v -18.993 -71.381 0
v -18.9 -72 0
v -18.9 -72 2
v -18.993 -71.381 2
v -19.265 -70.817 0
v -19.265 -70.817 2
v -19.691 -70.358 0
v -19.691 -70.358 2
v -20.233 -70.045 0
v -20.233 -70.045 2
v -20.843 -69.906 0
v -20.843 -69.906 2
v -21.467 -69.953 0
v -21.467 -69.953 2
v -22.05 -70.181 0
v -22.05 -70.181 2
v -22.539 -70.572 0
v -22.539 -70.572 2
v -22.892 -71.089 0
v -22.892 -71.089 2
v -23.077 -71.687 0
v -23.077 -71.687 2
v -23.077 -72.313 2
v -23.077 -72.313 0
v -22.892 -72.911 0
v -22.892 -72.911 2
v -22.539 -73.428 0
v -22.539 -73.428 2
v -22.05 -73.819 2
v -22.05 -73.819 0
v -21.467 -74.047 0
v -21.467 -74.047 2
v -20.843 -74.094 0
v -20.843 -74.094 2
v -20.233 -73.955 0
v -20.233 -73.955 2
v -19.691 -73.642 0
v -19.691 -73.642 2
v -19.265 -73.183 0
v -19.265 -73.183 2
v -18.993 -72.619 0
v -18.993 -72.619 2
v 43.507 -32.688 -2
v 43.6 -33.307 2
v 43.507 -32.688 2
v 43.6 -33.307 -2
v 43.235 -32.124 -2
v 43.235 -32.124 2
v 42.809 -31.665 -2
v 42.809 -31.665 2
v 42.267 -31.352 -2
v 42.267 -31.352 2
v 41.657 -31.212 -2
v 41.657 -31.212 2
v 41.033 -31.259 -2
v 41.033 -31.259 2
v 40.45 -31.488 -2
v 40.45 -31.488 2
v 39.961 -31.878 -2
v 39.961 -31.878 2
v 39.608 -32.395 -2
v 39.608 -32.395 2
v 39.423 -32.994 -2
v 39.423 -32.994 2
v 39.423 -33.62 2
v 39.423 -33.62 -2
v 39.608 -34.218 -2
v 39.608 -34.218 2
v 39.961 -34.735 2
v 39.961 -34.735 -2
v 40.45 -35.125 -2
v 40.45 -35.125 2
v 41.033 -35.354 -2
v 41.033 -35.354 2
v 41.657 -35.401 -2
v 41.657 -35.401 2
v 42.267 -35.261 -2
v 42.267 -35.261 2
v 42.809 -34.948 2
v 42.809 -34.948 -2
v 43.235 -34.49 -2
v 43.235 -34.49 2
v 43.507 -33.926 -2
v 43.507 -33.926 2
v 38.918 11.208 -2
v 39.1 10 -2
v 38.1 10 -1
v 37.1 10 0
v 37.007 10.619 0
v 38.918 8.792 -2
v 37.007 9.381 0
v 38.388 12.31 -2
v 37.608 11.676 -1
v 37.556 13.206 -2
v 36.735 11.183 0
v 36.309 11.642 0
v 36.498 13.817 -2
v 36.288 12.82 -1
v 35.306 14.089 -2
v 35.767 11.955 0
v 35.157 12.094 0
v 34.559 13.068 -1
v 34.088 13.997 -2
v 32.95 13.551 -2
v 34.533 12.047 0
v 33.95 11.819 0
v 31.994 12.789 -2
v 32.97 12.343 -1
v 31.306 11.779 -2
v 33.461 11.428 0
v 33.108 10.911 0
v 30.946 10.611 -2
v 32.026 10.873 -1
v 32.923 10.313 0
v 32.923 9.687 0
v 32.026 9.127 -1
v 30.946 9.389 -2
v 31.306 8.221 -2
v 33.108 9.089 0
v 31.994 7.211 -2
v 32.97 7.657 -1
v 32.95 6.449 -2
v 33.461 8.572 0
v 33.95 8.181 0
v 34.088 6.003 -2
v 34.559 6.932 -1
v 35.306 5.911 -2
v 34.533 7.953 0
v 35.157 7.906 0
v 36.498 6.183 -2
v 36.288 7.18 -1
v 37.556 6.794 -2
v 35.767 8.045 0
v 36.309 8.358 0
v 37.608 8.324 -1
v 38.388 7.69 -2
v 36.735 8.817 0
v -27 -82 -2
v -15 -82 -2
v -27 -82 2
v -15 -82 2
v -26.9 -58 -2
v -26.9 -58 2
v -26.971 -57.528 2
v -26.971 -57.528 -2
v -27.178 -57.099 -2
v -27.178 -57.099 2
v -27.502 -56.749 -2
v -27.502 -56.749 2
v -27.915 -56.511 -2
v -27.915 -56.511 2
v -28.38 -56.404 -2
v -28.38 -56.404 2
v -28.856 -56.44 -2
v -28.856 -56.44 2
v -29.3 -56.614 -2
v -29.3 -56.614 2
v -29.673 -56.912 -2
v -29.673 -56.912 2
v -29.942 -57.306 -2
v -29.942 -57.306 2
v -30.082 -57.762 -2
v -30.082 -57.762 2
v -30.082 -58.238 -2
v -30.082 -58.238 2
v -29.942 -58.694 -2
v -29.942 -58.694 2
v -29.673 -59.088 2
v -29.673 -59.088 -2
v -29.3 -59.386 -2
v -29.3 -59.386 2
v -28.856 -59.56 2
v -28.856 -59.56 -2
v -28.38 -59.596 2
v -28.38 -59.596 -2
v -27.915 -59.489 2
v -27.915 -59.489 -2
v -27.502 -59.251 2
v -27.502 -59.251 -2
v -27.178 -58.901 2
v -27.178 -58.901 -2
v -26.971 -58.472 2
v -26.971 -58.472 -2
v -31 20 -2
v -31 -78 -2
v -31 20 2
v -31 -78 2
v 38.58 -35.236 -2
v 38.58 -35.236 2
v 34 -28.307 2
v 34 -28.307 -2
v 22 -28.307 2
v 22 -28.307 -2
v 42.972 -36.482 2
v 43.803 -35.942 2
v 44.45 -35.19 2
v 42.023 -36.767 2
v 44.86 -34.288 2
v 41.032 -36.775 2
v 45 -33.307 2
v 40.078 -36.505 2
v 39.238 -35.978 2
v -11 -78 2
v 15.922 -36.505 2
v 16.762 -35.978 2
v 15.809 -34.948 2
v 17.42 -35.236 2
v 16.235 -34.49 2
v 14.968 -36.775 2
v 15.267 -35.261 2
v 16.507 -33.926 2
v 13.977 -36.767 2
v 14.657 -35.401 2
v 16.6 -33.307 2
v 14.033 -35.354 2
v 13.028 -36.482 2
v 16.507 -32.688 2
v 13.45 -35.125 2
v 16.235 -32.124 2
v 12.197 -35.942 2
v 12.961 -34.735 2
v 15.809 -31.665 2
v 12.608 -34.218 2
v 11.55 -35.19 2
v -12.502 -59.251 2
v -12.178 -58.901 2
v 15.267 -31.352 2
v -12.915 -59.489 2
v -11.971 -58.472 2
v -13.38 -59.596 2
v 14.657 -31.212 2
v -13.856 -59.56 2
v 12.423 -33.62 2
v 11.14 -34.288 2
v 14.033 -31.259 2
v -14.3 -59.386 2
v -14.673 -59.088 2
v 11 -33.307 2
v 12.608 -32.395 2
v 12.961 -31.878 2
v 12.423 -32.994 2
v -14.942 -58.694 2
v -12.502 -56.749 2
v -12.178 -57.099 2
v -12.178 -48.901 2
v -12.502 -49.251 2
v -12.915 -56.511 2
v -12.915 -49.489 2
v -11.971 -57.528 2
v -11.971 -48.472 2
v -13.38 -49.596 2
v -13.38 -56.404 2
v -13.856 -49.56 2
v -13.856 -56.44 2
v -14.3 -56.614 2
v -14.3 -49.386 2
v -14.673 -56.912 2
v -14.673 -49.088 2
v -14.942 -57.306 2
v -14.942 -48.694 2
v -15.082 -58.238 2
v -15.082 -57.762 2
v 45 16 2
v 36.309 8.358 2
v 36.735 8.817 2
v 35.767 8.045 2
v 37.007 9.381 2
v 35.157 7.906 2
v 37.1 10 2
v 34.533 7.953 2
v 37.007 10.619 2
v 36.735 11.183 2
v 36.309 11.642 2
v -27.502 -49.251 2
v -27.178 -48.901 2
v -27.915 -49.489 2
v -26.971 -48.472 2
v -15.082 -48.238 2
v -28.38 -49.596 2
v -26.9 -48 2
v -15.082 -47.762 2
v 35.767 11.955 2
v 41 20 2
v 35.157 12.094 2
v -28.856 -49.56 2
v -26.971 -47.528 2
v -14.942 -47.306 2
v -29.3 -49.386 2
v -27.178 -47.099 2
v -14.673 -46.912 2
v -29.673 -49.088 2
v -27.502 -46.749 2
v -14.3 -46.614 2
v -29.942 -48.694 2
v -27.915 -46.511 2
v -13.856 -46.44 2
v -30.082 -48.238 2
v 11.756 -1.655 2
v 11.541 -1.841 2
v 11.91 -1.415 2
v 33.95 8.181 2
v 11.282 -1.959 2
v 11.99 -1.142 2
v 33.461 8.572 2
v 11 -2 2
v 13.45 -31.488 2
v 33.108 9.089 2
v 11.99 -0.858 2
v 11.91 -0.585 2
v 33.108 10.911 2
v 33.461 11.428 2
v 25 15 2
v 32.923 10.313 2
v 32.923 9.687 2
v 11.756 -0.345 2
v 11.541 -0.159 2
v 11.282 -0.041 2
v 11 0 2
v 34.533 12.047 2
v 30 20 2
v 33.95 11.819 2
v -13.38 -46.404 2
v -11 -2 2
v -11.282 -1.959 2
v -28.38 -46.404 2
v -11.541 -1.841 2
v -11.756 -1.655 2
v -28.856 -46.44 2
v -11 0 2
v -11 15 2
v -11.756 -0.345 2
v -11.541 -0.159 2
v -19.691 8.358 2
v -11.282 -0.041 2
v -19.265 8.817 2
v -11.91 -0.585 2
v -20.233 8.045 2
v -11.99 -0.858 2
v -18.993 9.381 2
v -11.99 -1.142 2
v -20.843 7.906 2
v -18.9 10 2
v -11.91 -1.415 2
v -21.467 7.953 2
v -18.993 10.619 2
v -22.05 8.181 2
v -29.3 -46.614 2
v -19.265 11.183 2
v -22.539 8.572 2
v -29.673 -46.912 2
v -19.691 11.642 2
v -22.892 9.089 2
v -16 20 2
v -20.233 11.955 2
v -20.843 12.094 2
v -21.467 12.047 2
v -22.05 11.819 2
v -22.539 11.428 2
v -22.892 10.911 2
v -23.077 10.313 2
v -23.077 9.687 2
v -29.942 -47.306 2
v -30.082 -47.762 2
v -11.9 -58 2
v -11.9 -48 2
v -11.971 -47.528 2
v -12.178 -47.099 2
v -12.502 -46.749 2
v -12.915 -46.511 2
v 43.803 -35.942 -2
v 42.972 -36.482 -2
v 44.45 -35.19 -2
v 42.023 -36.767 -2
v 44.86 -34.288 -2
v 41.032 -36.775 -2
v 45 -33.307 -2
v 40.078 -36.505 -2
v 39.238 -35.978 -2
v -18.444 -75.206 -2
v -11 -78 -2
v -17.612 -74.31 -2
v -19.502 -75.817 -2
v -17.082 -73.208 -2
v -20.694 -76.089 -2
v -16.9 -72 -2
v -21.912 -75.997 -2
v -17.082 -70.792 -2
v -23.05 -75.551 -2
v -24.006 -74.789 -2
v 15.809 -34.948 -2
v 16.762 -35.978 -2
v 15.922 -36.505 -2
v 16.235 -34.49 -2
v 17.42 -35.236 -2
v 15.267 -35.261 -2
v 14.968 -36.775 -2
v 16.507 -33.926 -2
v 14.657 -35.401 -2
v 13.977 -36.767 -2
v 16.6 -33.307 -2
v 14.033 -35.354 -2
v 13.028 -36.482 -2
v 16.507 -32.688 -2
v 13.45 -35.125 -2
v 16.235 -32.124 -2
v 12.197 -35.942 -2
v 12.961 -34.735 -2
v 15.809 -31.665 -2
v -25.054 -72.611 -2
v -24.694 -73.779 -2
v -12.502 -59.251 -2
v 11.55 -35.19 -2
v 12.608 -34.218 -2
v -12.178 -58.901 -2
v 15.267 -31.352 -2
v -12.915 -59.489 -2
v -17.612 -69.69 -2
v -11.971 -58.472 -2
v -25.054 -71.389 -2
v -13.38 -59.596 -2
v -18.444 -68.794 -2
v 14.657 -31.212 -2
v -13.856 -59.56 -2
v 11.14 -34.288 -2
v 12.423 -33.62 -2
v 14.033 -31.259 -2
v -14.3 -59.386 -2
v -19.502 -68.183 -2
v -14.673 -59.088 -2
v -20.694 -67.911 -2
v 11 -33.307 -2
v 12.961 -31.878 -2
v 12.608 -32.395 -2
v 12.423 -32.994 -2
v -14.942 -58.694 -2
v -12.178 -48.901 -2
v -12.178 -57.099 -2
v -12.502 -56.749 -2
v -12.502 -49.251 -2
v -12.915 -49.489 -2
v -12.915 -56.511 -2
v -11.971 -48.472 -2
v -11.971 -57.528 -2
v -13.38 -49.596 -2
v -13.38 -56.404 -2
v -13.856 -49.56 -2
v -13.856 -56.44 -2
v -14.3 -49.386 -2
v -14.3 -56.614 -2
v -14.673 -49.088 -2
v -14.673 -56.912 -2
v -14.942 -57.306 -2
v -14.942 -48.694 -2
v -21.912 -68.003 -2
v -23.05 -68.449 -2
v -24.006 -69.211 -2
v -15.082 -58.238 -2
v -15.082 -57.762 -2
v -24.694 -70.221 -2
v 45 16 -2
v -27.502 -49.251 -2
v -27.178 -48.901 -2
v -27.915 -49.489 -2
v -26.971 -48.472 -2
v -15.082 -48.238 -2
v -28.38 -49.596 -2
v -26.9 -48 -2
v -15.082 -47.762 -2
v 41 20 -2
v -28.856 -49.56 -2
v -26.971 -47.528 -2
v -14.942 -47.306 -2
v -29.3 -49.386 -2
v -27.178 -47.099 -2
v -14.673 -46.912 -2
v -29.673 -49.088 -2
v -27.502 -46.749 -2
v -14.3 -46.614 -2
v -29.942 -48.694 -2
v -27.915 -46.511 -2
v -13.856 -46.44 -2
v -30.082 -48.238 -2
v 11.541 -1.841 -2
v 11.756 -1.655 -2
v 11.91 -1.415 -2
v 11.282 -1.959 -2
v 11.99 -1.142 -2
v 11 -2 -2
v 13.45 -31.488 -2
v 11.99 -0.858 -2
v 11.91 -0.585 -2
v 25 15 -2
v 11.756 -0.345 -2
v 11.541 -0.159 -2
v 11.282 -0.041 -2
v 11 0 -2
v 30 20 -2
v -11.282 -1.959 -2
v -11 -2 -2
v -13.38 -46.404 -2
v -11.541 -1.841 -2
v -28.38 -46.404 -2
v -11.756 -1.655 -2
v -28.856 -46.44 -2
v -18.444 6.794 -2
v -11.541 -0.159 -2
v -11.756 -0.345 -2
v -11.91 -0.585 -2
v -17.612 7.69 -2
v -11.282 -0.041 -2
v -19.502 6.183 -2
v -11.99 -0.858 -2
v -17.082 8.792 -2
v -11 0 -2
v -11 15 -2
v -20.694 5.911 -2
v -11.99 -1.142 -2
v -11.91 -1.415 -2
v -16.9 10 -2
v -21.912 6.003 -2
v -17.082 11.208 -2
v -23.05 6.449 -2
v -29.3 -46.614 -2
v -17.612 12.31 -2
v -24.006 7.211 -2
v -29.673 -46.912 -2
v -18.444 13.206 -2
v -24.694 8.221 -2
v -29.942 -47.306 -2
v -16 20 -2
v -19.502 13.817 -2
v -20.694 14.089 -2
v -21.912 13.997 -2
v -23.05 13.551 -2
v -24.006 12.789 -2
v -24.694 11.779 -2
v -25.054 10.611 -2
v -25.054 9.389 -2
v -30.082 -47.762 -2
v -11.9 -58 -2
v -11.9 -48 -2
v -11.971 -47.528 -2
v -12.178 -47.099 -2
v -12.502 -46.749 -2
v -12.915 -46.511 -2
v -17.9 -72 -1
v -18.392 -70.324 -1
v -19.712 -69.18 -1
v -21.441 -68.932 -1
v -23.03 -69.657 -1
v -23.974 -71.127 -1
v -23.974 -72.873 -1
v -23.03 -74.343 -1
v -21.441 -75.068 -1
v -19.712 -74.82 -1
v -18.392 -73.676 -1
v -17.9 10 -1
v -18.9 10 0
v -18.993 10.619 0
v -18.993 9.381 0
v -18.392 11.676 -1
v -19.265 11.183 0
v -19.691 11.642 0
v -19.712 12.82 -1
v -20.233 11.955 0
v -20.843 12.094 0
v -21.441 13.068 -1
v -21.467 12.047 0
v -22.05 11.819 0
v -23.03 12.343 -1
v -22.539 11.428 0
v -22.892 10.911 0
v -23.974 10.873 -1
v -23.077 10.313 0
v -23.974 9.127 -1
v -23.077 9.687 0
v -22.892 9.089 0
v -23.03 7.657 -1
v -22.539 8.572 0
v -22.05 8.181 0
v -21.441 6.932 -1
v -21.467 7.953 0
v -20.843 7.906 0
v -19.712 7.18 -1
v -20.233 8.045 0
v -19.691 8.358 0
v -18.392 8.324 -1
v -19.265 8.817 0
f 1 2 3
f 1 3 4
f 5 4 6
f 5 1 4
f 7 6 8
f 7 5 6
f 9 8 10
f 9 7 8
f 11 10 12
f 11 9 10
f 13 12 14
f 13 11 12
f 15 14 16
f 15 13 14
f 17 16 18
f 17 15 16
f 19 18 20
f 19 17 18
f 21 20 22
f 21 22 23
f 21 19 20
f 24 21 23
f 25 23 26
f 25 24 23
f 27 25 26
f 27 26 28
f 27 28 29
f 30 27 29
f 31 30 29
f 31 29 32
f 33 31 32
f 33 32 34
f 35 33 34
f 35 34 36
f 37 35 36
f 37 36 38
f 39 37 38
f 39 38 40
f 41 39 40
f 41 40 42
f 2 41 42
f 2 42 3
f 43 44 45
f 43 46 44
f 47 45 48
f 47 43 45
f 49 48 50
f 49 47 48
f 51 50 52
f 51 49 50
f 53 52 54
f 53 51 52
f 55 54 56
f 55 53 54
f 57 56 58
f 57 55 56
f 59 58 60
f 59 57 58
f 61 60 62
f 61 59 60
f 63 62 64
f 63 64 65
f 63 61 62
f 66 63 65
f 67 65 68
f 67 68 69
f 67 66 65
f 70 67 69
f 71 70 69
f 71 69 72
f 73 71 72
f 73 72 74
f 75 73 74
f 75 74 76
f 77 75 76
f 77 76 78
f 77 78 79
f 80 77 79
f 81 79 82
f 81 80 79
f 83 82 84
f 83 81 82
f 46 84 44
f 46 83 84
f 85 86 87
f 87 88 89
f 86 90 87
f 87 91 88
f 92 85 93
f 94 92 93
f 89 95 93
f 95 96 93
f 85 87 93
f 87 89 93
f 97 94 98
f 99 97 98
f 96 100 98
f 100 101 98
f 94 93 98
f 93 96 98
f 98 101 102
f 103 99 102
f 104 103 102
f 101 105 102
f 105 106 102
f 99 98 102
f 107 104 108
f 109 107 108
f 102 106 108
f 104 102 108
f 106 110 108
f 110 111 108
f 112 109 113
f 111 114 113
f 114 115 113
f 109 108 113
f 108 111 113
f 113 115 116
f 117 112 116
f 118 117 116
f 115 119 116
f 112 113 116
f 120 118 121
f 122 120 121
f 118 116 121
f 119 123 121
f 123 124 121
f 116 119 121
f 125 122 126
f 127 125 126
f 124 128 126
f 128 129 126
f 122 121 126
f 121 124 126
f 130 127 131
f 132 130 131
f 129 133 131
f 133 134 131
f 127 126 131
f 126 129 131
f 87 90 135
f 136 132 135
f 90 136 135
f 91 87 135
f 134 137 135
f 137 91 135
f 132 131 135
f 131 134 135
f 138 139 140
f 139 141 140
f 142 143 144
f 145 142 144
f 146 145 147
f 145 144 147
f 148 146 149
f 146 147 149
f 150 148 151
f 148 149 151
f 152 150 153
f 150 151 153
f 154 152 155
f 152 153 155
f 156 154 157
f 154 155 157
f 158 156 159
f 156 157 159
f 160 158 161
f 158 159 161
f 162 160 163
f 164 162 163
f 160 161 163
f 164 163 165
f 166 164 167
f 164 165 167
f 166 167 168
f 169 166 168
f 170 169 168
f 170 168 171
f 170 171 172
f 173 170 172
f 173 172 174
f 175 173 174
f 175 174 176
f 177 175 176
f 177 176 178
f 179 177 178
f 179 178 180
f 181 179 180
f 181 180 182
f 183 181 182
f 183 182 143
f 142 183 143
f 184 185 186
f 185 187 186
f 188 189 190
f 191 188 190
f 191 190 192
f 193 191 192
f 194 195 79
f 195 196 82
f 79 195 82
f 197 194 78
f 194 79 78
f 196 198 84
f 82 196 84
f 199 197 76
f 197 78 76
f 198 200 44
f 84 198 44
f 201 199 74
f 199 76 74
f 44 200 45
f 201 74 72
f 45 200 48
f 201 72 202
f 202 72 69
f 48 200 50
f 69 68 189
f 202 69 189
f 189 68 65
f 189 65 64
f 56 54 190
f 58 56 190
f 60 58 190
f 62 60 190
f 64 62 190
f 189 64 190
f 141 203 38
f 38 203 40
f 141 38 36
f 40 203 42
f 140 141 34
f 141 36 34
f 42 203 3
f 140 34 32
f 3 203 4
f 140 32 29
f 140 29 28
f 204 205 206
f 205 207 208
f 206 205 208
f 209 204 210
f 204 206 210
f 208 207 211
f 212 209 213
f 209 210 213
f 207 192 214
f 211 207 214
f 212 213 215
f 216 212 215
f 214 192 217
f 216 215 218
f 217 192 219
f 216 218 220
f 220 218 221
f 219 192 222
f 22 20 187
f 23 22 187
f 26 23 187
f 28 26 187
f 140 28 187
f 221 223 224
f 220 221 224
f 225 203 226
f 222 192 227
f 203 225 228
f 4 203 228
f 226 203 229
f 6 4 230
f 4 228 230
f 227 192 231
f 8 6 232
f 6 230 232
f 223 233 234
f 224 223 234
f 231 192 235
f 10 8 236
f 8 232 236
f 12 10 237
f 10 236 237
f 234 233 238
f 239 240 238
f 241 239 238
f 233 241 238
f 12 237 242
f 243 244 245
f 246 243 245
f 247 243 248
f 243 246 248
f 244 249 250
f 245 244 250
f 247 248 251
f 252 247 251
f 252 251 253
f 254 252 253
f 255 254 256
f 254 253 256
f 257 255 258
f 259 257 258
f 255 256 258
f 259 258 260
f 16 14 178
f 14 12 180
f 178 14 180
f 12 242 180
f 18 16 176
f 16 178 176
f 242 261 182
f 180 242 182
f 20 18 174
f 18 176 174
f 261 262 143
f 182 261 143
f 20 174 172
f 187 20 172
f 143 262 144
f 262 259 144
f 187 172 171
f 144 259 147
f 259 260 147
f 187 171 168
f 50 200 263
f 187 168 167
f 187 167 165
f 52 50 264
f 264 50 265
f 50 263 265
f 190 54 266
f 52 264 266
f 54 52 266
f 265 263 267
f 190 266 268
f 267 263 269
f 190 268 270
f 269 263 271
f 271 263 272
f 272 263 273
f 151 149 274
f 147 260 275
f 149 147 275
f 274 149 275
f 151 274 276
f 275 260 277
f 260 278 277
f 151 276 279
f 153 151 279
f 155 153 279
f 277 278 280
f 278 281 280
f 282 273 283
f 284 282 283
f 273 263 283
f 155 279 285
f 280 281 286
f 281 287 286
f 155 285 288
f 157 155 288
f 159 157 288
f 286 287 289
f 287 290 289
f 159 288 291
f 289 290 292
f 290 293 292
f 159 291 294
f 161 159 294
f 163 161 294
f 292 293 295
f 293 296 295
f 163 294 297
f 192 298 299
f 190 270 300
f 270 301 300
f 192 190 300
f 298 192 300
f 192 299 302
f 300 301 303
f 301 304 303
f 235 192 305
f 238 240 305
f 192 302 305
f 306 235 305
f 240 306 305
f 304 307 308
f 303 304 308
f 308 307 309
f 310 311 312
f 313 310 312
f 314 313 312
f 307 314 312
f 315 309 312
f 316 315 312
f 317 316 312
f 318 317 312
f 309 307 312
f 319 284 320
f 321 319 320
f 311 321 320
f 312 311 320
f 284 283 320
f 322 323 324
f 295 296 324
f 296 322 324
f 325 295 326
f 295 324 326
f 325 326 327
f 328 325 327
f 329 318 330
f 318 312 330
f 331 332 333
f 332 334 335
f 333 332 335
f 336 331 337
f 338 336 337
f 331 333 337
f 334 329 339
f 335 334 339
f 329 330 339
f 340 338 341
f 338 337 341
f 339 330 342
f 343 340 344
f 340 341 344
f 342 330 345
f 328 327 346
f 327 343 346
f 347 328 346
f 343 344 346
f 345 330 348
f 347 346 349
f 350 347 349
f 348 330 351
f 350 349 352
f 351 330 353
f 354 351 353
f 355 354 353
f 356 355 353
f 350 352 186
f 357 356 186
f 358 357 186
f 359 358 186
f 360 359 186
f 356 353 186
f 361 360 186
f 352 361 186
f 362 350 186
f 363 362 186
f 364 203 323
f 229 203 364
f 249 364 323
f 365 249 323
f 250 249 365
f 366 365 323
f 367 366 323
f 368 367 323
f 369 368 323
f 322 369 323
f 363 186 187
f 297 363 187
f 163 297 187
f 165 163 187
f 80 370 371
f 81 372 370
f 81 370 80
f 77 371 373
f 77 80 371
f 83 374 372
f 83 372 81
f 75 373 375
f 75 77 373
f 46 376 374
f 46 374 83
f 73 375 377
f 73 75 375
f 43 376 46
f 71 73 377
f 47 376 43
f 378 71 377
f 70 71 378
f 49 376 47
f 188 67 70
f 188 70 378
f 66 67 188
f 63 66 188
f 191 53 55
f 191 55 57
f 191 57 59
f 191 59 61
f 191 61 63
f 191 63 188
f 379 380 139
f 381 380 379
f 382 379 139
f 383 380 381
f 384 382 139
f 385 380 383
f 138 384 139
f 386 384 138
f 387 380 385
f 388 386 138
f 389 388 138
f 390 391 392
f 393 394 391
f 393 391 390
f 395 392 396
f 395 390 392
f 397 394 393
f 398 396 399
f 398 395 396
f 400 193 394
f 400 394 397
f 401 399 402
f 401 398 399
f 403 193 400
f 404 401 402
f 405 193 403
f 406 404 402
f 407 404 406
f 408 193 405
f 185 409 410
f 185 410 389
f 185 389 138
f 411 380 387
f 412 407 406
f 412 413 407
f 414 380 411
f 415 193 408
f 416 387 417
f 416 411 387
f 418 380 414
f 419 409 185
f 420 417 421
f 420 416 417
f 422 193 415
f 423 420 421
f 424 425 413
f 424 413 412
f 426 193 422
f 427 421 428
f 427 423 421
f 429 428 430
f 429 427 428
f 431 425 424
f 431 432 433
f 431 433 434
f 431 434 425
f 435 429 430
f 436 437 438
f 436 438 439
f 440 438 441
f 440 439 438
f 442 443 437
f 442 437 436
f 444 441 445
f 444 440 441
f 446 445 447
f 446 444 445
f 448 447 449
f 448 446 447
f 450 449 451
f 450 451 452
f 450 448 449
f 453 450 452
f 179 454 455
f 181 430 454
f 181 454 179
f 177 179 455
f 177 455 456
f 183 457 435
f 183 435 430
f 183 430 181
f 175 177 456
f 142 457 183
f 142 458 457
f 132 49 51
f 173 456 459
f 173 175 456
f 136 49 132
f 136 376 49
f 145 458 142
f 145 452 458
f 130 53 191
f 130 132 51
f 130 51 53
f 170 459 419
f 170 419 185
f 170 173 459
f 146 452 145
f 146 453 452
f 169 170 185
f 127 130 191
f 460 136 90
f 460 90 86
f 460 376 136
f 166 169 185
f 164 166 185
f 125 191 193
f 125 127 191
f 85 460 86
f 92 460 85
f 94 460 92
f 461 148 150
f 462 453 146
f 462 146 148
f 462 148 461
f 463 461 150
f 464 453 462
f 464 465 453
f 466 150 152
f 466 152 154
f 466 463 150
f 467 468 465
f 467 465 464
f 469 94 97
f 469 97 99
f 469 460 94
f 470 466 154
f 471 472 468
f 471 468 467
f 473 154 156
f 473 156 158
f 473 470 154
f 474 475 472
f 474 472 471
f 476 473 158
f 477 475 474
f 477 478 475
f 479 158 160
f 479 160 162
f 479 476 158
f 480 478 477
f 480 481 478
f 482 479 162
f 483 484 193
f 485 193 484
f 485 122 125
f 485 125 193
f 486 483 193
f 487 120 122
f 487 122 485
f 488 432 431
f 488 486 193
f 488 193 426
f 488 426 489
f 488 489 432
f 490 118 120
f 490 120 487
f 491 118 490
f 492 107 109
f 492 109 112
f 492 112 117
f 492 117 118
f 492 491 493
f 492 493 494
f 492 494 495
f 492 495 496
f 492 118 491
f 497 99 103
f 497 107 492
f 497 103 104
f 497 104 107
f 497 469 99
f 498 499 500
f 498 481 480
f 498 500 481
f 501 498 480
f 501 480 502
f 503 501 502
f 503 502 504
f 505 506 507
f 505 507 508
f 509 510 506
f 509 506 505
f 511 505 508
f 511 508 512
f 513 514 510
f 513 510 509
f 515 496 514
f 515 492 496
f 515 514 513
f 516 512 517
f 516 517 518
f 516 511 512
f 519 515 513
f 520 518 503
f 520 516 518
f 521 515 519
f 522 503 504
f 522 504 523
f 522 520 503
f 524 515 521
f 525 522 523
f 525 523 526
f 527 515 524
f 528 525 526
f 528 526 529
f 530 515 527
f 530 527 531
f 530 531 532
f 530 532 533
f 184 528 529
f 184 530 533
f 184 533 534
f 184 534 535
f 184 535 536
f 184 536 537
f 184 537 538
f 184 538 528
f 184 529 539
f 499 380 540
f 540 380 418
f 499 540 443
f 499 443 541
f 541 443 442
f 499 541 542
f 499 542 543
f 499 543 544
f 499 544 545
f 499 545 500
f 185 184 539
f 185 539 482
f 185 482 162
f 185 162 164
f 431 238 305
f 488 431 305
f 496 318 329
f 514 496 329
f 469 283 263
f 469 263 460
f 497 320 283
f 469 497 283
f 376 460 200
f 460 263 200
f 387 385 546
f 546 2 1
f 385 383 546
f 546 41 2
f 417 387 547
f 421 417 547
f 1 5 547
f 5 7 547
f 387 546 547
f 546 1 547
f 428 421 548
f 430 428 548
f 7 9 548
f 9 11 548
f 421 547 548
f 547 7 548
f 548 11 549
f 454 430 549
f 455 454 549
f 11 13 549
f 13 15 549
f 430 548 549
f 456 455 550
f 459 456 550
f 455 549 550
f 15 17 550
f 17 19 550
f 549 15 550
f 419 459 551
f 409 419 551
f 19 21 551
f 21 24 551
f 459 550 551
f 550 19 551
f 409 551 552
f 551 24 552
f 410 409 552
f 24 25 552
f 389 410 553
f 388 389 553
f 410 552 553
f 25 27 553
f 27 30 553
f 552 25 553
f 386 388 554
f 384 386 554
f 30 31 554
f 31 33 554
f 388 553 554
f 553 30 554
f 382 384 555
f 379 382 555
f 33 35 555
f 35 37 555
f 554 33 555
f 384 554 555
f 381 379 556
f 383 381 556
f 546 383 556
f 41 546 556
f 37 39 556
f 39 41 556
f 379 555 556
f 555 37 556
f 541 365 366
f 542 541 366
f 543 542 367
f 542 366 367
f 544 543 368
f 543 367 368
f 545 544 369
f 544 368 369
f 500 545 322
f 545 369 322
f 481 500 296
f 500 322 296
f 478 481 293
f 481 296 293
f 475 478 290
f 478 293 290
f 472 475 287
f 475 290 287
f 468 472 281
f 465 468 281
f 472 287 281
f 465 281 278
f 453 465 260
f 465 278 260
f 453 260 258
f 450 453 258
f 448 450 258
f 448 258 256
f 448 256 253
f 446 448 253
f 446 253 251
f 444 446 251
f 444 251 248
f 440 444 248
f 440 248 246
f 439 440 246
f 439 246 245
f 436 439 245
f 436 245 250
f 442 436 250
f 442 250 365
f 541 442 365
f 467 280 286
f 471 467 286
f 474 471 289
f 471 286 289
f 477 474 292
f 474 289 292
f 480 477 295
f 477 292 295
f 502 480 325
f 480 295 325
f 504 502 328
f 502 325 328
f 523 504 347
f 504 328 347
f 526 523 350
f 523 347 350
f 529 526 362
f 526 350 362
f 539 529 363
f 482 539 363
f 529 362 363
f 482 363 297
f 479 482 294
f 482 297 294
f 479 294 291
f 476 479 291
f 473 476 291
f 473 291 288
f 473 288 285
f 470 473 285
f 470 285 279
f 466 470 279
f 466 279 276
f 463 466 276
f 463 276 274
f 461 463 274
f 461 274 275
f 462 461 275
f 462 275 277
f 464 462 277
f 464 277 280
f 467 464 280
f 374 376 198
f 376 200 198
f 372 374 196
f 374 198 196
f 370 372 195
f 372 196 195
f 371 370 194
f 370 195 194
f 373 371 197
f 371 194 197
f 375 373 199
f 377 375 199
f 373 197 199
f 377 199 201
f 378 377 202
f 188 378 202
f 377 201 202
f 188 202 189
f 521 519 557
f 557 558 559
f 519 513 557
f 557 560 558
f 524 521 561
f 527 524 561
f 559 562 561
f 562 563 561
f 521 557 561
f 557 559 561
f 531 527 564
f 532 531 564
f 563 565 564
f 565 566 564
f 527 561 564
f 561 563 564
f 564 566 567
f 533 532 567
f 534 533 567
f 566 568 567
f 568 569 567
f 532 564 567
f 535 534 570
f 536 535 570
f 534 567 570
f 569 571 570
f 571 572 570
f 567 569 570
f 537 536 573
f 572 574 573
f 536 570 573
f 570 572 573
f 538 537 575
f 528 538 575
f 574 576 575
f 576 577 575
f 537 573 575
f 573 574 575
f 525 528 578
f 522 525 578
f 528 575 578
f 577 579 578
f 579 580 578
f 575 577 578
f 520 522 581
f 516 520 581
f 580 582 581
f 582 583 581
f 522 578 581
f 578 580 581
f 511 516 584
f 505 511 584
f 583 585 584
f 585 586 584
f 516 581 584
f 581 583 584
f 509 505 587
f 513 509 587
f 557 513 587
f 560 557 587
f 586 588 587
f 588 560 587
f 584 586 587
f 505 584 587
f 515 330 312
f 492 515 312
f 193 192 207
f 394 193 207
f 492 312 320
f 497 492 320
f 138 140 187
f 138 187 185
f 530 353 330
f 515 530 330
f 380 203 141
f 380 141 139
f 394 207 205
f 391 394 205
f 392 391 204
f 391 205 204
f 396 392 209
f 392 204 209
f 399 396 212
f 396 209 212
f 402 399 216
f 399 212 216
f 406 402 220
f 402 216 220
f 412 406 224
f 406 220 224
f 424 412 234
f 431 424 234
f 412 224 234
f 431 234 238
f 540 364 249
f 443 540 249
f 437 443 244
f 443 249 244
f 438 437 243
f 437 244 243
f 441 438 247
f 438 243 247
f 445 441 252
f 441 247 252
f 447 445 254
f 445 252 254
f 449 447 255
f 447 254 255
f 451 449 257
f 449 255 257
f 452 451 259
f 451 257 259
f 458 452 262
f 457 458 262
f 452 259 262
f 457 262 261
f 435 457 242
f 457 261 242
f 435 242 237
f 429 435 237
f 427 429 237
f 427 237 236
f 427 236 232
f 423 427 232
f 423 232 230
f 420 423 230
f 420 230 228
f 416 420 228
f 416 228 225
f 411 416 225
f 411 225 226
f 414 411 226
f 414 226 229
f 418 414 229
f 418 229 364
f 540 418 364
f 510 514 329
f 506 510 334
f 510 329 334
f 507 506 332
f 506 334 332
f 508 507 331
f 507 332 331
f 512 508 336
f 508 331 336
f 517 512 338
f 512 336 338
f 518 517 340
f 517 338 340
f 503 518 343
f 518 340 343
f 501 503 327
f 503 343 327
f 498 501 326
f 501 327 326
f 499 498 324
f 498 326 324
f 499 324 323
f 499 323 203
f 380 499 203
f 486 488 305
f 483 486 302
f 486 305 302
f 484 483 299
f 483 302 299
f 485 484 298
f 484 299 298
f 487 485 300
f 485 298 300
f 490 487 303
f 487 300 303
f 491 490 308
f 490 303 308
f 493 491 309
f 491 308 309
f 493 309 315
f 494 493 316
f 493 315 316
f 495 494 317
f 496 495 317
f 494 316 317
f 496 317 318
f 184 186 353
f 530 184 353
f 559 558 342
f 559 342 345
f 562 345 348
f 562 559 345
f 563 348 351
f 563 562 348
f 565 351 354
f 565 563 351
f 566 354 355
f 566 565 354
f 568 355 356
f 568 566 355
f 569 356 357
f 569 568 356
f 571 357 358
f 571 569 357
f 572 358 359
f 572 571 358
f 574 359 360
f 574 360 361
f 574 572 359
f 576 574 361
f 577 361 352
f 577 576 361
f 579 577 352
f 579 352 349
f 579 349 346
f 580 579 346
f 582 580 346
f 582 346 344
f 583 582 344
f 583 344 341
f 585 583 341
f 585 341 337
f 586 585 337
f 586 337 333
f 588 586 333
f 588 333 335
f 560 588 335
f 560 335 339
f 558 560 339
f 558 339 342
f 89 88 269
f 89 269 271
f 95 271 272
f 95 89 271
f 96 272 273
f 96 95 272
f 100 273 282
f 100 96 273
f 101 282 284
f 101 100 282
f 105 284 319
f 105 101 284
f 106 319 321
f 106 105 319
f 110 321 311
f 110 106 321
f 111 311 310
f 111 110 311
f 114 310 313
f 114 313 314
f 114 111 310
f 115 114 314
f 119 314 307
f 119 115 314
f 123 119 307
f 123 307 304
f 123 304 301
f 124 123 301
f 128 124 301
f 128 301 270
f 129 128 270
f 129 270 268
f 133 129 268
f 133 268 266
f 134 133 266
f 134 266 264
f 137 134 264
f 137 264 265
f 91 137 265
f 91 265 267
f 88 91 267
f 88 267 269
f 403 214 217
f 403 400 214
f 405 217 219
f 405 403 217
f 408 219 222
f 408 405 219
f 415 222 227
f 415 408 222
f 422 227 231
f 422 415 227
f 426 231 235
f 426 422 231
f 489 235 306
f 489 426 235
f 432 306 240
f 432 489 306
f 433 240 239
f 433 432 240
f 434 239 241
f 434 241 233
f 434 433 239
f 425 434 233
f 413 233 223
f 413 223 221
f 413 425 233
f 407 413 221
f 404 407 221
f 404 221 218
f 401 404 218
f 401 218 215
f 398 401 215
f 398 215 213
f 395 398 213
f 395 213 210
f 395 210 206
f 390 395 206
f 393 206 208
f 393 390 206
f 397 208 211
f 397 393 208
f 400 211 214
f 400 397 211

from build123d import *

# Parameters (mm, degrees)
SKETCH_1_R          = 2.1
EXTRUDE_1_DEPTH     = 2
CUT_EXTRUDE_1_DEPTH = 94.621578709
CHAMFER_1_SIZE      = 2
SKETCH_4_R          = 1
CUT_EXTRUDE_2_DEPTH = 94.621578709
CHAMFER_2_SIZE      = 4
SKETCH_7_R          = 1.6
CUT_EXTRUDE_3_DEPTH = 94.621578709


with BuildPart() as part:
    # 草图1 → 凸台-拉伸1 (new, symmetric)
    with BuildSketch(Plane.XY):
        with BuildLine():
            Line((11, 0), (-11, 0))
            Line((-11, 0), (-11, -82))
            Line((-11, -82), (-31, -82))
            Line((-31, -82), (-31, 20))
            Line((-31, 20), (45, 20))
            Line((45, 20), (45, -33.306562209))
            ThreePointArc((45, -33.306562209), (42.507569164, -36.65839818), (38.580111783, -35.236394534))
            Line((38.580111783, -35.236394534), (34, -28.306562209))
            Line((34, -28.306562209), (22, -28.306562209))
            Line((22, -28.306562209), (17.419888217, -35.236394534))
            ThreePointArc((17.419888217, -35.236394534), (13.492430836, -36.65839818), (11, -33.306562209))
            Line((11, -33.306562209), (11, 0))
        make_face()
        with Locations((-21, 10)):
            Circle(SKETCH_1_R, mode=Mode.SUBTRACT)
        with Locations((35, 10)):
            Circle(SKETCH_1_R, mode=Mode.SUBTRACT)
        with Locations((14.5, -33.306562209)):
            Circle(SKETCH_1_R, mode=Mode.SUBTRACT)
        with Locations((41.5, -33.306562209)):
            Circle(SKETCH_1_R, mode=Mode.SUBTRACT)
        with Locations((-21, -72)):
            Circle(SKETCH_1_R, mode=Mode.SUBTRACT)
    extrude(amount=EXTRUDE_1_DEPTH, both=True)

    # 草图3 → 切除-拉伸1 (cut, through all)
    with BuildSketch(Plane.XY.offset(2)):
        Polygon((-16, 20), (-11, 15), (25, 15), (30, 20), align=None)
    extrude(amount=-CUT_EXTRUDE_1_DEPTH, mode=Mode.SUBTRACT)

    # 倒角1
    chamfer_1_edges = [part.edges().sort_by_distance(p)[0] for p in [
        (-23.1, 10, -2),
        (32.9, 10, -2),
        (-23.1, -72, -2),
    ]]
    chamfer(chamfer_1_edges, length=CHAMFER_1_SIZE)

    # 草图4 → 切除-拉伸2 (cut, through all)
    with BuildSketch(Plane.XY.offset(2)):
        with Locations((-11, -1)):
            Circle(SKETCH_4_R)
        with Locations((11, -1)):
            Circle(SKETCH_4_R)
    extrude(amount=-CUT_EXTRUDE_2_DEPTH, mode=Mode.SUBTRACT)

    # 倒角2
    chamfer_2_edges = [part.edges().sort_by_distance(p)[0] for p in [
        (-11, -82, 0),
        (-31, -82, 0),
        (45, 20, 0),
    ]]
    chamfer(chamfer_2_edges, length=CHAMFER_2_SIZE)

    # 草图7 → 切除-拉伸3 (cut, through all)
    with BuildSketch(Plane.XY.offset(2)):
        with Locations((-28.5, -48)):
            Circle(SKETCH_7_R)
        with Locations((-28.5, -58)):
            Circle(SKETCH_7_R)
        with Locations((-13.5, -48)):
            Circle(SKETCH_7_R)
        with Locations((-13.5, -58)):
            Circle(SKETCH_7_R)
    extrude(amount=-CUT_EXTRUDE_3_DEPTH, mode=Mode.SUBTRACT)


solid = part.part
